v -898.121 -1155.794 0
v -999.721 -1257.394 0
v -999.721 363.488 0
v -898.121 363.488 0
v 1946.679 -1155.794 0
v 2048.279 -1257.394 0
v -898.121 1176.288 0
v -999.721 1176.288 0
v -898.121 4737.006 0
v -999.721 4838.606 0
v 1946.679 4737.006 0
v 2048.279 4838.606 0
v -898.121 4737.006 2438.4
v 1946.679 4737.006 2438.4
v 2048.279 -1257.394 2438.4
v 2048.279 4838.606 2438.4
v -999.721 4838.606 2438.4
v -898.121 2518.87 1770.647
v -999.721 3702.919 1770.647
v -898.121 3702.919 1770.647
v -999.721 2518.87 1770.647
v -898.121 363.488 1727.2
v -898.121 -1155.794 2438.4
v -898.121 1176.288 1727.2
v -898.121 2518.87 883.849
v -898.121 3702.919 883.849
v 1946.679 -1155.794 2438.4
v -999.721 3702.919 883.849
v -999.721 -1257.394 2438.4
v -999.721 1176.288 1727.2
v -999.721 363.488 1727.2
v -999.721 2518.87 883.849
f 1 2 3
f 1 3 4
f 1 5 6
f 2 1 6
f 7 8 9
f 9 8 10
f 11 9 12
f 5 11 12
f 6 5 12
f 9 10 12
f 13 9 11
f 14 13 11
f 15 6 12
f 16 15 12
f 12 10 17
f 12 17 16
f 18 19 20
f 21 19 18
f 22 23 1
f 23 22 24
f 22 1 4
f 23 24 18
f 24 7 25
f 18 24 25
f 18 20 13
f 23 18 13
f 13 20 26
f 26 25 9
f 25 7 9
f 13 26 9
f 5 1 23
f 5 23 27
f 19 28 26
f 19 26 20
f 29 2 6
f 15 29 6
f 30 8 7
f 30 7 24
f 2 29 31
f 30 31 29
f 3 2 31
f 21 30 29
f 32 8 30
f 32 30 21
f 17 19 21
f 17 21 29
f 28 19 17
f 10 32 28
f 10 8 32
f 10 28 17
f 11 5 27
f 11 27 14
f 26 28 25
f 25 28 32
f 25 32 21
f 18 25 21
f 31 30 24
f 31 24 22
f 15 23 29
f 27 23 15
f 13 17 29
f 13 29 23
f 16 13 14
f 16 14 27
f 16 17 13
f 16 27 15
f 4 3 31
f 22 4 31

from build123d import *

# Parameters (mm, degrees)
F0_W     = 3048
F0_H     = 6096
F0_W_2   = 2844.8
F0_H_2   = 5892.8
F1_DEPTH = 2438.4
F2_W     = 1184.048891
F2_H     = 886.798144
F2_W_2   = 812.8
F2_H_2   = 1727.2
F3_DEPTH = 101.6


with BuildPart() as f1:
    # F0 (on Top) → F1 (new body)
    with BuildSketch(Plane.XY):
        with Locations((524.279082, 1790.606042)):
            Rectangle(F0_W, F0_H)
        with Locations((524.279082, 1790.606042)):
            Rectangle(F0_W_2, F0_H_2, mode=Mode.SUBTRACT)
    extrude(amount=F1_DEPTH)

    # F2 (on face) → F3 (cut, through all)
    with BuildSketch(Plane(origin=(-999.720918, 0, 0), x_dir=(0, -1, 0), z_dir=(-1, 0, 0))):
        with Locations((-3110.894799, 1327.248335)):
            Rectangle(F2_W, F2_H)
        with Locations((-769.88777, 863.6)):
            Rectangle(F2_W_2, F2_H_2)
    extrude(amount=-F3_DEPTH, mode=Mode.SUBTRACT)


solid = f1.part
